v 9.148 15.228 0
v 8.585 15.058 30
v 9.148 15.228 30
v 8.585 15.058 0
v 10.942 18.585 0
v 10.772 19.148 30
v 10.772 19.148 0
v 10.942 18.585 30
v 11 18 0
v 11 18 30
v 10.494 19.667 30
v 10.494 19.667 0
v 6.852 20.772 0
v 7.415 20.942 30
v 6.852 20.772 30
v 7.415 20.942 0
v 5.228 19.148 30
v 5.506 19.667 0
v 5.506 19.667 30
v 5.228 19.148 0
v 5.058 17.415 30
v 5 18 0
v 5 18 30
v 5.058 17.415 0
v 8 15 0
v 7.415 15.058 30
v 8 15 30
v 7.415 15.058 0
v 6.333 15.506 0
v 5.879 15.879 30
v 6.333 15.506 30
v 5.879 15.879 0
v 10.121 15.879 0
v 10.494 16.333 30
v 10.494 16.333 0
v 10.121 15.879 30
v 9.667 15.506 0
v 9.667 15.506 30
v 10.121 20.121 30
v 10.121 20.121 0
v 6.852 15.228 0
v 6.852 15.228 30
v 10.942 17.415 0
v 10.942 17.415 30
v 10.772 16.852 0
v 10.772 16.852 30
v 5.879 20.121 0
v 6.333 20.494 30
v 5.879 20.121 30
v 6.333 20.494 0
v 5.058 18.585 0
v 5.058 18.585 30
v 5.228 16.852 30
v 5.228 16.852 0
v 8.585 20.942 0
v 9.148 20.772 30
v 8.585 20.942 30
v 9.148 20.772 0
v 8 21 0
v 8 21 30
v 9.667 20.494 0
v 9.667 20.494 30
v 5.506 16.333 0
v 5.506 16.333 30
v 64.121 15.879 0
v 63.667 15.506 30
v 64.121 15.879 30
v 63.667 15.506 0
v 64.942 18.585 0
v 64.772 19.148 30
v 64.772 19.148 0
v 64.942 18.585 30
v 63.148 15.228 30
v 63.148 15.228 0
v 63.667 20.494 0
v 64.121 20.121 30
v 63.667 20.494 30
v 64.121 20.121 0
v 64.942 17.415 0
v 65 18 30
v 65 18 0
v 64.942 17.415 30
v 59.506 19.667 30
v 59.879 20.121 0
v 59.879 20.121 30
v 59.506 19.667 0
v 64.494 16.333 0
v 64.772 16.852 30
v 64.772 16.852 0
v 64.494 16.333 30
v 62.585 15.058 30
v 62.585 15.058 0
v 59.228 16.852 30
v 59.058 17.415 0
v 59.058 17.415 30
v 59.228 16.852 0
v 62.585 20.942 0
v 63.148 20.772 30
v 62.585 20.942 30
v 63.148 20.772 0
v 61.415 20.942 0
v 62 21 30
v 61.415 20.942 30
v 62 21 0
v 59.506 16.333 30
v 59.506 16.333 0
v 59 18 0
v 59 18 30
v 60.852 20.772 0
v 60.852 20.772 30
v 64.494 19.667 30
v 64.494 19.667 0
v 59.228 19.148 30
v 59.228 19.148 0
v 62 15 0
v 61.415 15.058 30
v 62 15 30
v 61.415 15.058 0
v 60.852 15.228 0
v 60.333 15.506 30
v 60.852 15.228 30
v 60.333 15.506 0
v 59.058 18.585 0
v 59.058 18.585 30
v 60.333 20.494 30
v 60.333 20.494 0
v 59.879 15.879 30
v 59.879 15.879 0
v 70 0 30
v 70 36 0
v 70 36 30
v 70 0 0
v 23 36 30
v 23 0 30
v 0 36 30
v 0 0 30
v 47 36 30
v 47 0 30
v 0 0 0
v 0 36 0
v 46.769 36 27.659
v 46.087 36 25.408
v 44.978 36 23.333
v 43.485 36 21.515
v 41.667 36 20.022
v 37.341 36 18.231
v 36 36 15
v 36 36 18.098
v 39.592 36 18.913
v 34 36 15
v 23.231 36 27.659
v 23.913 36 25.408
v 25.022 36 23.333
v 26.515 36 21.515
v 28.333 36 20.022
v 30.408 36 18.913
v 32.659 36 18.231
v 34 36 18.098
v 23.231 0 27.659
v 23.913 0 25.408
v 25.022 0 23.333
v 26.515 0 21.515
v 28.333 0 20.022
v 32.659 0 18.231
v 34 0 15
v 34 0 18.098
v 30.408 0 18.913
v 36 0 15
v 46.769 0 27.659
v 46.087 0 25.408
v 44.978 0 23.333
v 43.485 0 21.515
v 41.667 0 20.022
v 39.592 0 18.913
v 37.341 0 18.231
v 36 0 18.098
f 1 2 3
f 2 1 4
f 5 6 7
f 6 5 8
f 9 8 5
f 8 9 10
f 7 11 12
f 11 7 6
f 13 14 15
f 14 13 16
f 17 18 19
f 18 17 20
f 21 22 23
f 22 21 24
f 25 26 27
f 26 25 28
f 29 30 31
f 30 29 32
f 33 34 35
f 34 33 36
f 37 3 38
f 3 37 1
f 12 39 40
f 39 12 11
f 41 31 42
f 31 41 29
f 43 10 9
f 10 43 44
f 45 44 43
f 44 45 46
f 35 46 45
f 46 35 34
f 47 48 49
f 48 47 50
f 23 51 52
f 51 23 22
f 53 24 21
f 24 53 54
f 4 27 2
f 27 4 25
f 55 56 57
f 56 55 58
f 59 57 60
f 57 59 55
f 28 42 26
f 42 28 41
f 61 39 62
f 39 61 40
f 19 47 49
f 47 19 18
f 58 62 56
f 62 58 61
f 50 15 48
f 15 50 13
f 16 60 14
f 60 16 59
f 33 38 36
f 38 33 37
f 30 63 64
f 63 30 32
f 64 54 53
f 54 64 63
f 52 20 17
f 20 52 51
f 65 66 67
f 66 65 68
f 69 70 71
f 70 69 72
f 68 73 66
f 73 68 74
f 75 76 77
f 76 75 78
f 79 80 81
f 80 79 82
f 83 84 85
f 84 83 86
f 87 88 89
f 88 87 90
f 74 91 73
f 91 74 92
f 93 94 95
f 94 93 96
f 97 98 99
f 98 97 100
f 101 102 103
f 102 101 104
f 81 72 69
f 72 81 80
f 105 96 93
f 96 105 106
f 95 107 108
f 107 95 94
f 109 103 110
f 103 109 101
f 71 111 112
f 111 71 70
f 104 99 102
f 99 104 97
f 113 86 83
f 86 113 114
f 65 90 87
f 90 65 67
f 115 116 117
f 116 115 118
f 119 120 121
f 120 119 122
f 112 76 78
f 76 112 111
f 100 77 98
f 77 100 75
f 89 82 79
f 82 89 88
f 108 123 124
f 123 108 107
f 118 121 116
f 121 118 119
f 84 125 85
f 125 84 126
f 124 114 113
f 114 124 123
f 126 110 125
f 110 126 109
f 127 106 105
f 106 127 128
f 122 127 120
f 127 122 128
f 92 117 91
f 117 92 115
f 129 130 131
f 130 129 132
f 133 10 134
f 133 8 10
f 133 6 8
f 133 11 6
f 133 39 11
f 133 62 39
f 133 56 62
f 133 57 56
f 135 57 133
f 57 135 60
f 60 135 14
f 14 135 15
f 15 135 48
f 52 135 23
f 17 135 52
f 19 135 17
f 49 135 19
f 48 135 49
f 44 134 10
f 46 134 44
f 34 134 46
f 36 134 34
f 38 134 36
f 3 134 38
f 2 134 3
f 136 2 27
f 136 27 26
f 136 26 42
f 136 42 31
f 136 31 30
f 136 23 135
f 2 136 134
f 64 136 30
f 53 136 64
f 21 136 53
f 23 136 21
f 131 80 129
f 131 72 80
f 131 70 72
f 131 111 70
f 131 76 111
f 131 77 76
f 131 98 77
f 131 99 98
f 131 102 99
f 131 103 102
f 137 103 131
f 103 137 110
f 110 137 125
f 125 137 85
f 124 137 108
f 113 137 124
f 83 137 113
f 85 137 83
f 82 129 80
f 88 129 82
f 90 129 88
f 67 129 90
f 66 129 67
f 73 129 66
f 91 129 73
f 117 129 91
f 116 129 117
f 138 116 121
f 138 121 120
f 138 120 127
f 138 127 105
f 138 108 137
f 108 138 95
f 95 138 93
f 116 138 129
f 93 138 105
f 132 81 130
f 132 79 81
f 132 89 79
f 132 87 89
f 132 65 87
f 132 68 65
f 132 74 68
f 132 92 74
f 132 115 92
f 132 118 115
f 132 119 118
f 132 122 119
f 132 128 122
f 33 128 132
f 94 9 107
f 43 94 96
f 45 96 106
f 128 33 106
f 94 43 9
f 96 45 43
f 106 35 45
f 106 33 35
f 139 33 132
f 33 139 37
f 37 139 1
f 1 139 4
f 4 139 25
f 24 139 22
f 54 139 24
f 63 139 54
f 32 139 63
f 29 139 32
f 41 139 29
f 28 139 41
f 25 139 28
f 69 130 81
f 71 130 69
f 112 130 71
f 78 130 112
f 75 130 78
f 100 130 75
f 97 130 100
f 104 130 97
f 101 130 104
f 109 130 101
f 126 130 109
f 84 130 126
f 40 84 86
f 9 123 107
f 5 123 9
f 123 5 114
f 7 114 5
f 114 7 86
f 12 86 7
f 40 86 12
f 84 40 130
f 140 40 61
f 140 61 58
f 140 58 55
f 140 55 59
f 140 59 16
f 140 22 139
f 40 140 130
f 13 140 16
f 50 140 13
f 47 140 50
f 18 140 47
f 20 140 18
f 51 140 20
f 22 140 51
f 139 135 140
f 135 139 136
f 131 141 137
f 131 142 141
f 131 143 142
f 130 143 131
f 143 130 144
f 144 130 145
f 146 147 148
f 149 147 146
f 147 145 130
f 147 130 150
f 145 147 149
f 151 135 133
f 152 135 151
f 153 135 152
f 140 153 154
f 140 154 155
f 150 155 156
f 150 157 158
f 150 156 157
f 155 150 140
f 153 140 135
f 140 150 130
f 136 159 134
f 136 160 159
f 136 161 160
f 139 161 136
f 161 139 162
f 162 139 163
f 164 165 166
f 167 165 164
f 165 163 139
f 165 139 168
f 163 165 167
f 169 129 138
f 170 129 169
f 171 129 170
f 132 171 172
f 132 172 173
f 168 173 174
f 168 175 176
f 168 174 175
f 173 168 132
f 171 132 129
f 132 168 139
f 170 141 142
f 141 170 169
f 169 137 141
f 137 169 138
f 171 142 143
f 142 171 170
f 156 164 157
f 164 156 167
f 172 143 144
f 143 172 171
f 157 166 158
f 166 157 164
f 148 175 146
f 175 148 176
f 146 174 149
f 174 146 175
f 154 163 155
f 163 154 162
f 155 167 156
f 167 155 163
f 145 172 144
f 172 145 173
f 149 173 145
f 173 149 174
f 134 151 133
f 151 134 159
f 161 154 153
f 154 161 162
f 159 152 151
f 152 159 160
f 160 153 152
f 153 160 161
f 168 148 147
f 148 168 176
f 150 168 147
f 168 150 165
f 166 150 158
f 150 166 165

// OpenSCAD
$fn = 32;

// ----------------------------------------------------------------------
// Saddle clamp: split shaft clamp
// ----------------------------------------------------------------------

// --- parameters (mm) ---
blk_l = 70;               // block length, X
blk_w = 36;               // block width, Y
blk_h = 30;               // block height
clamp_r = 12;             // shaft groove radius
hole_r = 3;               // bolt hole radius
hole_m = 8;               // bolt hole margin from the ends
saw_w = 2;                // saw kerf width

saw_depth = clamp_r + 3;  // saw kerf depth

difference() {
  cube([blk_l, blk_w, blk_h]);
  translate([blk_l / 2, -1, blk_h])
    rotate([-90, 0, 0])
      cylinder(h = blk_w + 2, r = clamp_r);
  for (sx = [0, 1])
    translate([sx ? blk_l - hole_m : hole_m, blk_w / 2, -1])
      cylinder(r = hole_r, h = blk_h + 2);
  translate([blk_l / 2 - saw_w / 2, -1, blk_h - saw_depth])
    cube([saw_w, blk_w + 2, saw_depth + 1]);
}
